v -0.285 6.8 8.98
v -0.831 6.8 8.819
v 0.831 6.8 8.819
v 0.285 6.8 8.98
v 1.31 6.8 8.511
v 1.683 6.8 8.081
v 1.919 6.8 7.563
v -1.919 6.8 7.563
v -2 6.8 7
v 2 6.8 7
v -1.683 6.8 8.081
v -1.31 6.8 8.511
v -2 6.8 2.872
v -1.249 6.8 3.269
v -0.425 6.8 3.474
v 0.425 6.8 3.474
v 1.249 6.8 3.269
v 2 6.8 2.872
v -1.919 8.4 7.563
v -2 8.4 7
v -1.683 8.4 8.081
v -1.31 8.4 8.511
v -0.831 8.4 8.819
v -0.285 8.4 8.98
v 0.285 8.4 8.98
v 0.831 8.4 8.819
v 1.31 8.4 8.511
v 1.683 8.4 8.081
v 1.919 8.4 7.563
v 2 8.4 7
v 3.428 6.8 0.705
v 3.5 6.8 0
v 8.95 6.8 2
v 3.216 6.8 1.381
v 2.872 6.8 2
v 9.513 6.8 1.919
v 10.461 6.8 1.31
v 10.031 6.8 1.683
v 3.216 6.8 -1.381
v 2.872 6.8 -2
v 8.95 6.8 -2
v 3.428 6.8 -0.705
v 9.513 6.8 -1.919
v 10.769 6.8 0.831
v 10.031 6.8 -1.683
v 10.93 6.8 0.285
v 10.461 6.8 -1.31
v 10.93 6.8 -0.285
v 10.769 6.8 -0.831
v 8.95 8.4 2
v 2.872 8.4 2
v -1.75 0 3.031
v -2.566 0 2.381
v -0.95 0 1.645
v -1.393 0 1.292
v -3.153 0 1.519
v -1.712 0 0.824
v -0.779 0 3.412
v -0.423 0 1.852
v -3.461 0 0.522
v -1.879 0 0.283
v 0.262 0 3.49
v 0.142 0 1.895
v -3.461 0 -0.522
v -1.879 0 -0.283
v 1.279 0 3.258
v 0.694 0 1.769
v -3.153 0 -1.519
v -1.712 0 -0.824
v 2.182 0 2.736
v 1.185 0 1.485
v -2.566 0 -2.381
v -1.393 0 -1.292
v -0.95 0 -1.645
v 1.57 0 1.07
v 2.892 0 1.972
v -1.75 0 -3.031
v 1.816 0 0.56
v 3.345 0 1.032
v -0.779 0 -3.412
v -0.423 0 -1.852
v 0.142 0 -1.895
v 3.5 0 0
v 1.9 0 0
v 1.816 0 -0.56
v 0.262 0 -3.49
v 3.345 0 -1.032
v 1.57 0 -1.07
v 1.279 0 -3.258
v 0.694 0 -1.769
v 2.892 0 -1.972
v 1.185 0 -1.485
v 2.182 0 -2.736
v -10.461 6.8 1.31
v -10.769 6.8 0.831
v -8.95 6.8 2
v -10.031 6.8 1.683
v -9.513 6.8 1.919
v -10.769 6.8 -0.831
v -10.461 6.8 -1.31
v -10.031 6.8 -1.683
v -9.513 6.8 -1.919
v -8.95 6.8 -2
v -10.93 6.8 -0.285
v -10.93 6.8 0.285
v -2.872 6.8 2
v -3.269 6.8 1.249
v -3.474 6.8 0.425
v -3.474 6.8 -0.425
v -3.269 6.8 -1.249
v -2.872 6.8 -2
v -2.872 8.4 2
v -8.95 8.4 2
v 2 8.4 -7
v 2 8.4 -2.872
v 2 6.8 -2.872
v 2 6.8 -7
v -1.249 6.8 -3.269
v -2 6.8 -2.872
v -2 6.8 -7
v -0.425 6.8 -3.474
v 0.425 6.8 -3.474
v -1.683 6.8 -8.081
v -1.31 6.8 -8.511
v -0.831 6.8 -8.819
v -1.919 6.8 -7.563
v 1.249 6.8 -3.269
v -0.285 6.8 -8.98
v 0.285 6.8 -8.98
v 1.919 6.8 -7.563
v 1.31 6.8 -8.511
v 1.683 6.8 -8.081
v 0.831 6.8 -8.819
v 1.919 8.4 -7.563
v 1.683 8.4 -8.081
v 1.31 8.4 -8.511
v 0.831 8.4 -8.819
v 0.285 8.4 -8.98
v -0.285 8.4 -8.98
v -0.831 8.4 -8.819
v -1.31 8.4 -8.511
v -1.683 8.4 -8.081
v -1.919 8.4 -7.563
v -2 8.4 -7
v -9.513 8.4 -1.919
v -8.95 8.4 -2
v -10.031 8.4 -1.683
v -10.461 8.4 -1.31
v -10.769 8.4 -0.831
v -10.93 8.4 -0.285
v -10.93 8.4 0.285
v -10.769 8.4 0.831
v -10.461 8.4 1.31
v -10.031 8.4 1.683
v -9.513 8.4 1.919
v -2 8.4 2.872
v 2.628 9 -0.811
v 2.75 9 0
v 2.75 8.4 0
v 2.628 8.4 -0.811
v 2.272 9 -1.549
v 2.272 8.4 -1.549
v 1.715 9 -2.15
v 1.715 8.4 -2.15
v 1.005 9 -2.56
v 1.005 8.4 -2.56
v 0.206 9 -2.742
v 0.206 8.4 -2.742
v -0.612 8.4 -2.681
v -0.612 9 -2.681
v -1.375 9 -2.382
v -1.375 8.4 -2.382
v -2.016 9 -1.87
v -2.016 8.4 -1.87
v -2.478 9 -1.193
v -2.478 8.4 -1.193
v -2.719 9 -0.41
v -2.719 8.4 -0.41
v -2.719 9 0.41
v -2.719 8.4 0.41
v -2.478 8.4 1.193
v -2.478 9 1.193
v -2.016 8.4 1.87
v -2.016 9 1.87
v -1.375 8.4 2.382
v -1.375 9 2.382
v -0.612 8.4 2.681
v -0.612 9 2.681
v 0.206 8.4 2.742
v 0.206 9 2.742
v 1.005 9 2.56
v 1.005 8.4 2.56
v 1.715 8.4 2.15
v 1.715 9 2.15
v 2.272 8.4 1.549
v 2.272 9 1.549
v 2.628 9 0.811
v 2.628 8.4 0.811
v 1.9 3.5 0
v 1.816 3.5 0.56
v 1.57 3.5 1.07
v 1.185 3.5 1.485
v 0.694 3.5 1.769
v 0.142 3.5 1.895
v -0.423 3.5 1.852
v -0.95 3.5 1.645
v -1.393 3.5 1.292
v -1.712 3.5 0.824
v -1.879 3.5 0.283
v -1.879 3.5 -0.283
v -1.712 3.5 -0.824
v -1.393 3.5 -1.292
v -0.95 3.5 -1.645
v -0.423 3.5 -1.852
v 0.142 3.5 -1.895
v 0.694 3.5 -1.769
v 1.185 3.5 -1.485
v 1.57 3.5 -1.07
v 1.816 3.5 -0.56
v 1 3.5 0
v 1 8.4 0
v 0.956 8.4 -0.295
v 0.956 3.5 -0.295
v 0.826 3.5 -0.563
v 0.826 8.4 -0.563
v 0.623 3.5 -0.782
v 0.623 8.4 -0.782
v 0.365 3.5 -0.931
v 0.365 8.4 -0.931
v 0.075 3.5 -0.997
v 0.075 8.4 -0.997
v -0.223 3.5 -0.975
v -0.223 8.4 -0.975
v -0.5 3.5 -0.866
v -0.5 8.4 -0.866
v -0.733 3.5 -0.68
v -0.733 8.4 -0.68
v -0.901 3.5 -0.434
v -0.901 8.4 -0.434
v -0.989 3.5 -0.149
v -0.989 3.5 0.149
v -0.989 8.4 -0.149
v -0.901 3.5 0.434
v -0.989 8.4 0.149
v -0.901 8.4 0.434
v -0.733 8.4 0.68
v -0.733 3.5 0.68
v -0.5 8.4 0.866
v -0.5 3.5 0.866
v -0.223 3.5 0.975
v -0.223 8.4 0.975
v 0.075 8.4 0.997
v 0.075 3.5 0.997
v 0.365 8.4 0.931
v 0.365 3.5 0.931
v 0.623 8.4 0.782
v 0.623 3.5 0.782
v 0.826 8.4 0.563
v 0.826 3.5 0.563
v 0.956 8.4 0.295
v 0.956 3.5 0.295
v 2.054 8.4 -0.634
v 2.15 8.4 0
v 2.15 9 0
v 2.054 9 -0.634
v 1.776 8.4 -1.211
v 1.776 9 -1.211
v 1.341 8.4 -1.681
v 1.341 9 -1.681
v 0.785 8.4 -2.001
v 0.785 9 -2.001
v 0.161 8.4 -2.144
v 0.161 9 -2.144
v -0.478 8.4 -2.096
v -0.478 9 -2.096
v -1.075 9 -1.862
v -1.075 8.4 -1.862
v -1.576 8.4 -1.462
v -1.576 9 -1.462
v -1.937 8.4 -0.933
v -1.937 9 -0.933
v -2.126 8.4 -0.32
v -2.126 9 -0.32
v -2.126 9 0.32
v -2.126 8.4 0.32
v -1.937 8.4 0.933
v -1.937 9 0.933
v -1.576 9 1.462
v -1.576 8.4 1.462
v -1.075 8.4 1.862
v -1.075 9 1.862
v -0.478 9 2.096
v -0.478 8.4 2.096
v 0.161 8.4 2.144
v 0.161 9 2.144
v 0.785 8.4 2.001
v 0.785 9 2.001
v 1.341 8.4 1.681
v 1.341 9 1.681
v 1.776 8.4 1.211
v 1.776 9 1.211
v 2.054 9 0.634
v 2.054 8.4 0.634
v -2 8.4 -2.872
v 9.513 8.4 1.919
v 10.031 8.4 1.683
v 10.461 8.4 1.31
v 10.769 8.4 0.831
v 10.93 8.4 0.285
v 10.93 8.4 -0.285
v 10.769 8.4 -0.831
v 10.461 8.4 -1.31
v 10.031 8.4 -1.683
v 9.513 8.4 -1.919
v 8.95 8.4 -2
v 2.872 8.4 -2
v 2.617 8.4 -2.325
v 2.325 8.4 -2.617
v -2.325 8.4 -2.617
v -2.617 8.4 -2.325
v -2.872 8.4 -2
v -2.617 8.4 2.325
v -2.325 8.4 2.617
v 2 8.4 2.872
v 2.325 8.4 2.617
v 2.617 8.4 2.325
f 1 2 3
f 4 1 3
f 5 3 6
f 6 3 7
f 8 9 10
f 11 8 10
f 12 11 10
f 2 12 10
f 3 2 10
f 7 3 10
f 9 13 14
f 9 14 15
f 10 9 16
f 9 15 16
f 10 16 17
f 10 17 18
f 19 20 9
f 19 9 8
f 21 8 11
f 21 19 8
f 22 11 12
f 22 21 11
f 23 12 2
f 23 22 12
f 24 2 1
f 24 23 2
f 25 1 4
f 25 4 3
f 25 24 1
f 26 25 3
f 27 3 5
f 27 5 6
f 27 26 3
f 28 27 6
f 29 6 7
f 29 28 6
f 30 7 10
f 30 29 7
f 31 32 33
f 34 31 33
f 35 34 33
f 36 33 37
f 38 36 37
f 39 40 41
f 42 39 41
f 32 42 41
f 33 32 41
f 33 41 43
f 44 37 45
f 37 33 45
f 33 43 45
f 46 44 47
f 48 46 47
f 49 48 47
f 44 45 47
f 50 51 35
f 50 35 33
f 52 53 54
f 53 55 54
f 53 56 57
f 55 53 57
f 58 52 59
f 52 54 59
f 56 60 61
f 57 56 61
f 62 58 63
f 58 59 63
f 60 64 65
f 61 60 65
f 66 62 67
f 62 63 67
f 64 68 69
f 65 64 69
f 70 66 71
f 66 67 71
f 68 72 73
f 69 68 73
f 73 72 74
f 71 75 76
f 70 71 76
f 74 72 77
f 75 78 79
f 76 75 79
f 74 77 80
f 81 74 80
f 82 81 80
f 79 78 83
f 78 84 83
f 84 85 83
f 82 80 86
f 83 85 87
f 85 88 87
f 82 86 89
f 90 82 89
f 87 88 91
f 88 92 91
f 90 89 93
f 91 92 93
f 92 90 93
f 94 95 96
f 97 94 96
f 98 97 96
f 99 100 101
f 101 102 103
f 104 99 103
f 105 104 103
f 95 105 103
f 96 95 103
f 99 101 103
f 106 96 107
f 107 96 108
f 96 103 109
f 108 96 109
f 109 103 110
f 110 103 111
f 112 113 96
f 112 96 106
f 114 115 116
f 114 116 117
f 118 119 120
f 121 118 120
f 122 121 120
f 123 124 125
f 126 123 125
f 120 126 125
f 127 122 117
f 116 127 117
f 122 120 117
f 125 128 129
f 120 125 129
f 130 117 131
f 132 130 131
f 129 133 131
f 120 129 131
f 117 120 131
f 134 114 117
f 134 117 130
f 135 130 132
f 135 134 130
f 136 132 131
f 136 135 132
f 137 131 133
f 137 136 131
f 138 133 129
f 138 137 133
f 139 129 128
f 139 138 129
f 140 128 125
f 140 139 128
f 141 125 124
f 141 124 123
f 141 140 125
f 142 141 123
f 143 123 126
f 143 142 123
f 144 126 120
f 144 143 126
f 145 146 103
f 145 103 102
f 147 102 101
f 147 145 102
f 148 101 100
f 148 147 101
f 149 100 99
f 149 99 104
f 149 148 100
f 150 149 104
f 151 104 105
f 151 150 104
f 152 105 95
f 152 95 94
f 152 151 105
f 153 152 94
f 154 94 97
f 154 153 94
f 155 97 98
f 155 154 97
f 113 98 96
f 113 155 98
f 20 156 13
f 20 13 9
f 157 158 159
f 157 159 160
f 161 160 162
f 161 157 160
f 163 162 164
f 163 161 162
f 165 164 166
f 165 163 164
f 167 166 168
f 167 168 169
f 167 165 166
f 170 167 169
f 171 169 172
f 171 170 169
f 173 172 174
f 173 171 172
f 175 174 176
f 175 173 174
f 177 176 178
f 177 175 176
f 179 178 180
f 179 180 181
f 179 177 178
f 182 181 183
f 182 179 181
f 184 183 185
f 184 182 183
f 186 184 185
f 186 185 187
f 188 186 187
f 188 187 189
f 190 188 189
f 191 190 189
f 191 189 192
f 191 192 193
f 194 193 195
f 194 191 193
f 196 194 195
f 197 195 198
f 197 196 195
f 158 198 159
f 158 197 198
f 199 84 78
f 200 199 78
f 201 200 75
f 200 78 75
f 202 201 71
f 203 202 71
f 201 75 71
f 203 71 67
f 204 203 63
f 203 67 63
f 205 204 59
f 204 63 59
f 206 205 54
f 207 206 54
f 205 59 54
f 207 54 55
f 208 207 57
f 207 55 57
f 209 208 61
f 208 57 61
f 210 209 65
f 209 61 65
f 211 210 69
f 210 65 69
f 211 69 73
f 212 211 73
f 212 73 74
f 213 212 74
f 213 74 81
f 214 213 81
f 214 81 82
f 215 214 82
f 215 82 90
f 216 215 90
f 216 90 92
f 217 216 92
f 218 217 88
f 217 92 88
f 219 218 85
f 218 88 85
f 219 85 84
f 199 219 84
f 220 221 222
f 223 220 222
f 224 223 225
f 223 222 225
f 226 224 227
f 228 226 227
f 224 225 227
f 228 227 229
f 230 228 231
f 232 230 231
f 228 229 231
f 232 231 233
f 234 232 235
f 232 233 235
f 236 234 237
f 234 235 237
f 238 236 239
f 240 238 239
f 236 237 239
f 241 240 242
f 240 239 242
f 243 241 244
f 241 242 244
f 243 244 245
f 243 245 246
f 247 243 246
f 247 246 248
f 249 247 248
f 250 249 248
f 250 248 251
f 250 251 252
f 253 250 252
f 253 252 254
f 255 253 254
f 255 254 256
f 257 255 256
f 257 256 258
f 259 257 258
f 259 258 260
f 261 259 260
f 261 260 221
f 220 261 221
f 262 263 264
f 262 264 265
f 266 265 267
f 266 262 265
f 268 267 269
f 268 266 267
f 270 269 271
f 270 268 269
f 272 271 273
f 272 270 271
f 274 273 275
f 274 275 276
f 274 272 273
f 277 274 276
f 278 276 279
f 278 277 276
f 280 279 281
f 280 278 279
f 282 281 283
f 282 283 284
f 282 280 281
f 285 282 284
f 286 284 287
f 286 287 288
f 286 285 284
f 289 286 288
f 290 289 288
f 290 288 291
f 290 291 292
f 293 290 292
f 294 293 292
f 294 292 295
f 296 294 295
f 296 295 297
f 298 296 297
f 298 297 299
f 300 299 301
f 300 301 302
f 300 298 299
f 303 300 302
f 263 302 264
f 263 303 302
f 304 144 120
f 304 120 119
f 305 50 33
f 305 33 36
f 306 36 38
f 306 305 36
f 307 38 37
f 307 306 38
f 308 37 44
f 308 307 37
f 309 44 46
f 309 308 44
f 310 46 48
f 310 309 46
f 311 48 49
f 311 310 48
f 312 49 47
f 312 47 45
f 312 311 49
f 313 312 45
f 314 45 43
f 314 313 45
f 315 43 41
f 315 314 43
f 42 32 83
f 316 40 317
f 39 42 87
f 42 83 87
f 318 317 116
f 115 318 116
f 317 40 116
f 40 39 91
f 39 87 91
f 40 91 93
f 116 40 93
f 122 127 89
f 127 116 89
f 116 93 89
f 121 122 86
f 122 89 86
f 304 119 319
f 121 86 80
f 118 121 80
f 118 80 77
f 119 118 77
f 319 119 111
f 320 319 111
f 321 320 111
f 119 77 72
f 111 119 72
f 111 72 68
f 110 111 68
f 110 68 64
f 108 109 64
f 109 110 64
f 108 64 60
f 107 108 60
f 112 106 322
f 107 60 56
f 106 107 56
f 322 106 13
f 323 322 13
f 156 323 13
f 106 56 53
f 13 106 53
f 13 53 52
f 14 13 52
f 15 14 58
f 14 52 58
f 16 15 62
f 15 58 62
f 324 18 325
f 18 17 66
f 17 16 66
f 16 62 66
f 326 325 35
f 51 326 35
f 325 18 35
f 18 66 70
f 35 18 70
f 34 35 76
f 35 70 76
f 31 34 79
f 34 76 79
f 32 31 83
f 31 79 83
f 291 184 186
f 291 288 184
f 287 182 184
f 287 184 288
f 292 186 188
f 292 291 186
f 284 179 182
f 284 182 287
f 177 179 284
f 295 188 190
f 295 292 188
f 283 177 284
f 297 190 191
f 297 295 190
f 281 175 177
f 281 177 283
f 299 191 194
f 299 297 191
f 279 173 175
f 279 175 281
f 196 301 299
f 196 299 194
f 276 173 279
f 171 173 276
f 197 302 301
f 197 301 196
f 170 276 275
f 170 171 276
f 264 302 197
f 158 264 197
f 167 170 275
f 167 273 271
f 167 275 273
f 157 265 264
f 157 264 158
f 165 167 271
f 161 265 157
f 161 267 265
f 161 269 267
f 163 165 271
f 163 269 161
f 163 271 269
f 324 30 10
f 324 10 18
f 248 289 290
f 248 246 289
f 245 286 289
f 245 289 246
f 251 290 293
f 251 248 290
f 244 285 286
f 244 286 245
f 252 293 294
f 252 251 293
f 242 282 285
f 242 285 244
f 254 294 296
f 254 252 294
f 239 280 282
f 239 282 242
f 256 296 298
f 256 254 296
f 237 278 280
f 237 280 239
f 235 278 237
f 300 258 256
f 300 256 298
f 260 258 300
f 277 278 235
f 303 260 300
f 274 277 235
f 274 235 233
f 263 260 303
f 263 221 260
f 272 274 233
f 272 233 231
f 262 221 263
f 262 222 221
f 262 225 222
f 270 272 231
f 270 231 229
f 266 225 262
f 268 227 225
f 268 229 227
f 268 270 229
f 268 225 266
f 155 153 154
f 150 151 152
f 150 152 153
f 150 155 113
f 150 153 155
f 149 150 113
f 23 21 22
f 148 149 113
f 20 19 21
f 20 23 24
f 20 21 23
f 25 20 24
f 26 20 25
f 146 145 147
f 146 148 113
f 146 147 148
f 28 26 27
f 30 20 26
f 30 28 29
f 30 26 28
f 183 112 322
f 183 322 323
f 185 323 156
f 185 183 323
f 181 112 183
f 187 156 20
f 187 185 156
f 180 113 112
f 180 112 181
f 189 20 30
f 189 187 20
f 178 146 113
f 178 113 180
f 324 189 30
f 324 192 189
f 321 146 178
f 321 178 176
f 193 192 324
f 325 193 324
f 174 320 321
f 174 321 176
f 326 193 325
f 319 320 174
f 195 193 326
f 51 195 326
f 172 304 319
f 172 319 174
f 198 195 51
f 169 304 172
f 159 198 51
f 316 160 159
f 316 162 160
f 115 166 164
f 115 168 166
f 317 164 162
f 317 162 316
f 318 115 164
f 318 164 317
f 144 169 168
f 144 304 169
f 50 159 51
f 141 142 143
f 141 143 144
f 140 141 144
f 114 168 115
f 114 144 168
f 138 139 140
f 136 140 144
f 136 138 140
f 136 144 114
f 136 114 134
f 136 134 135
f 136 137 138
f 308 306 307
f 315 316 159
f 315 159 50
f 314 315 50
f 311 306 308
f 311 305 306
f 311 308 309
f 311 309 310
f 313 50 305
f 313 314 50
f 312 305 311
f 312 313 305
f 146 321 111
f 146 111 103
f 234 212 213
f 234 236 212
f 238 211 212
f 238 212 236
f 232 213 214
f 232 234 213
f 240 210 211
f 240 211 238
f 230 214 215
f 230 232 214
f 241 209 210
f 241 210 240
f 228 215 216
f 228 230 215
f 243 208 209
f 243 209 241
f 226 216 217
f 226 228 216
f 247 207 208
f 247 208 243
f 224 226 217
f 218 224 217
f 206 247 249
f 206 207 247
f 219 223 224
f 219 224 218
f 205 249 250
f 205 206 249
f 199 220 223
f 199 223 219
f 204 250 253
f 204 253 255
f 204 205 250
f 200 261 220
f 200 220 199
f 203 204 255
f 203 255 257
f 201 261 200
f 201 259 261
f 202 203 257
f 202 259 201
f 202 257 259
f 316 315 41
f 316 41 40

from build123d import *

# Parameters (mm, degrees)
SZKIC1_R                    = 3.5
DODANIE_WYCI_GNI_CIE1_DEPTH = 9
SZKIC2_R                    = 1.9
WYTNIJ_WYCI_GNI_CIE1_DEPTH  = 3.5
SZKIC3_R                    = 2
DODANIE_WYCI_GNI_CIE2_DEPTH = 1.6
WYTNIJ_WYCI_GNI_CIE2_START  = -0.6
SZKIC4_R                    = 2.15
WYTNIJ_WYCI_GNI_CIE2_DEPTH  = 0.6
SZKIC5_R                    = 1
WYTNIJ_WYCI_GNI_CIE3_DEPTH  = 31.6
SZKIC6_R                    = 3.5
SZKIC6_R_2                  = 2.75
WYTNIJ_WYCI_GNI_CIE4_DEPTH  = 0.6


with BuildPart() as part:
    # Szkic1 → Dodanie-wyciągnięcie1 (new body)
    with BuildSketch(Plane(origin=(0, 0, 0), x_dir=(1, 0, 0), z_dir=(0, 1, 0))):
        Circle(SZKIC1_R)
    extrude(amount=DODANIE_WYCI_GNI_CIE1_DEPTH)

    # Szkic2 → Wytnij-wyciągnięcie1 (cut)
    with BuildSketch(Plane.XZ):
        Circle(SZKIC2_R)
    extrude(amount=-WYTNIJ_WYCI_GNI_CIE1_DEPTH, mode=Mode.SUBTRACT)

    # Szkic3 → Dodanie-wyciągnięcie2 (add)
    with BuildSketch(Plane(origin=(0, 8.4, 0), x_dir=(1, 0, 0), z_dir=(0, 1, 0))):
        with Locations((-8.95, 0)):
            Circle(SZKIC3_R)
        with BuildLine():
            Line((-2, 2), (-8.95, 2))
            ThreePointArc((-8.95, 2), (-7.535786438, 1.414213562), (-6.95, 0))
            ThreePointArc((-6.95, 0), (-7.535786438, -1.414213562), (-8.95, -2))
            Line((-8.95, -2), (-2, -2))
            Line((-2, -2), (-2, 2))
        make_face()
        with Locations((0, 7)):
            Circle(SZKIC3_R)
        with BuildLine():
            Line((-2, 7), (-2, 2))
            Line((-2, 2), (0, 2))
            Line((0, 2), (2, 2))
            Line((2, 2), (2, 7))
            ThreePointArc((2, 7), (0, 5), (-2, 7))
        make_face()
        with BuildLine():
            Line((8.95, 2), (2, 2))
            Line((2, 2), (2, 0))
            Line((2, 0), (2, -2))
            Line((2, -2), (8.95, -2))
            ThreePointArc((8.95, -2), (6.95, 0), (8.95, 2))
        make_face()
        with Locations((8.95, 0)):
            Circle(SZKIC3_R)
        with Locations((0, -7)):
            Circle(SZKIC3_R)
        with BuildLine():
            Line((2, -2), (-2, -2))
            Line((-2, -2), (-2, -7))
            ThreePointArc((-2, -7), (0, -5), (2, -7))
            Line((2, -7), (2, -2))
        make_face()
    extrude(amount=-DODANIE_WYCI_GNI_CIE2_DEPTH)

    # Szkic4 → Wytnij-wyciągnięcie2 (cut)
    with BuildSketch(Plane(origin=(0, 9, 0), x_dir=(1, 0, 0), z_dir=(0, 1, 0)).offset(WYTNIJ_WYCI_GNI_CIE2_START)):
        Circle(SZKIC4_R)
    extrude(amount=WYTNIJ_WYCI_GNI_CIE2_DEPTH, mode=Mode.SUBTRACT)

    # Szkic5 → Wytnij-wyciągnięcie3 (cut)
    with BuildSketch(Plane(origin=(0, 8.4, 0), x_dir=(1, 0, 0), z_dir=(0, 1, 0))):
        Circle(SZKIC5_R)
    extrude(amount=-WYTNIJ_WYCI_GNI_CIE3_DEPTH, mode=Mode.SUBTRACT)

    # Szkic6 → Wytnij-wyciągnięcie4 (cut)
    with BuildSketch(Plane(origin=(0, 9, 0), x_dir=(1, 0, 0), z_dir=(0, 1, 0))):
        Circle(SZKIC6_R)
        Circle(SZKIC6_R_2, mode=Mode.SUBTRACT)
    extrude(amount=-WYTNIJ_WYCI_GNI_CIE4_DEPTH, mode=Mode.SUBTRACT)


solid = part.part
